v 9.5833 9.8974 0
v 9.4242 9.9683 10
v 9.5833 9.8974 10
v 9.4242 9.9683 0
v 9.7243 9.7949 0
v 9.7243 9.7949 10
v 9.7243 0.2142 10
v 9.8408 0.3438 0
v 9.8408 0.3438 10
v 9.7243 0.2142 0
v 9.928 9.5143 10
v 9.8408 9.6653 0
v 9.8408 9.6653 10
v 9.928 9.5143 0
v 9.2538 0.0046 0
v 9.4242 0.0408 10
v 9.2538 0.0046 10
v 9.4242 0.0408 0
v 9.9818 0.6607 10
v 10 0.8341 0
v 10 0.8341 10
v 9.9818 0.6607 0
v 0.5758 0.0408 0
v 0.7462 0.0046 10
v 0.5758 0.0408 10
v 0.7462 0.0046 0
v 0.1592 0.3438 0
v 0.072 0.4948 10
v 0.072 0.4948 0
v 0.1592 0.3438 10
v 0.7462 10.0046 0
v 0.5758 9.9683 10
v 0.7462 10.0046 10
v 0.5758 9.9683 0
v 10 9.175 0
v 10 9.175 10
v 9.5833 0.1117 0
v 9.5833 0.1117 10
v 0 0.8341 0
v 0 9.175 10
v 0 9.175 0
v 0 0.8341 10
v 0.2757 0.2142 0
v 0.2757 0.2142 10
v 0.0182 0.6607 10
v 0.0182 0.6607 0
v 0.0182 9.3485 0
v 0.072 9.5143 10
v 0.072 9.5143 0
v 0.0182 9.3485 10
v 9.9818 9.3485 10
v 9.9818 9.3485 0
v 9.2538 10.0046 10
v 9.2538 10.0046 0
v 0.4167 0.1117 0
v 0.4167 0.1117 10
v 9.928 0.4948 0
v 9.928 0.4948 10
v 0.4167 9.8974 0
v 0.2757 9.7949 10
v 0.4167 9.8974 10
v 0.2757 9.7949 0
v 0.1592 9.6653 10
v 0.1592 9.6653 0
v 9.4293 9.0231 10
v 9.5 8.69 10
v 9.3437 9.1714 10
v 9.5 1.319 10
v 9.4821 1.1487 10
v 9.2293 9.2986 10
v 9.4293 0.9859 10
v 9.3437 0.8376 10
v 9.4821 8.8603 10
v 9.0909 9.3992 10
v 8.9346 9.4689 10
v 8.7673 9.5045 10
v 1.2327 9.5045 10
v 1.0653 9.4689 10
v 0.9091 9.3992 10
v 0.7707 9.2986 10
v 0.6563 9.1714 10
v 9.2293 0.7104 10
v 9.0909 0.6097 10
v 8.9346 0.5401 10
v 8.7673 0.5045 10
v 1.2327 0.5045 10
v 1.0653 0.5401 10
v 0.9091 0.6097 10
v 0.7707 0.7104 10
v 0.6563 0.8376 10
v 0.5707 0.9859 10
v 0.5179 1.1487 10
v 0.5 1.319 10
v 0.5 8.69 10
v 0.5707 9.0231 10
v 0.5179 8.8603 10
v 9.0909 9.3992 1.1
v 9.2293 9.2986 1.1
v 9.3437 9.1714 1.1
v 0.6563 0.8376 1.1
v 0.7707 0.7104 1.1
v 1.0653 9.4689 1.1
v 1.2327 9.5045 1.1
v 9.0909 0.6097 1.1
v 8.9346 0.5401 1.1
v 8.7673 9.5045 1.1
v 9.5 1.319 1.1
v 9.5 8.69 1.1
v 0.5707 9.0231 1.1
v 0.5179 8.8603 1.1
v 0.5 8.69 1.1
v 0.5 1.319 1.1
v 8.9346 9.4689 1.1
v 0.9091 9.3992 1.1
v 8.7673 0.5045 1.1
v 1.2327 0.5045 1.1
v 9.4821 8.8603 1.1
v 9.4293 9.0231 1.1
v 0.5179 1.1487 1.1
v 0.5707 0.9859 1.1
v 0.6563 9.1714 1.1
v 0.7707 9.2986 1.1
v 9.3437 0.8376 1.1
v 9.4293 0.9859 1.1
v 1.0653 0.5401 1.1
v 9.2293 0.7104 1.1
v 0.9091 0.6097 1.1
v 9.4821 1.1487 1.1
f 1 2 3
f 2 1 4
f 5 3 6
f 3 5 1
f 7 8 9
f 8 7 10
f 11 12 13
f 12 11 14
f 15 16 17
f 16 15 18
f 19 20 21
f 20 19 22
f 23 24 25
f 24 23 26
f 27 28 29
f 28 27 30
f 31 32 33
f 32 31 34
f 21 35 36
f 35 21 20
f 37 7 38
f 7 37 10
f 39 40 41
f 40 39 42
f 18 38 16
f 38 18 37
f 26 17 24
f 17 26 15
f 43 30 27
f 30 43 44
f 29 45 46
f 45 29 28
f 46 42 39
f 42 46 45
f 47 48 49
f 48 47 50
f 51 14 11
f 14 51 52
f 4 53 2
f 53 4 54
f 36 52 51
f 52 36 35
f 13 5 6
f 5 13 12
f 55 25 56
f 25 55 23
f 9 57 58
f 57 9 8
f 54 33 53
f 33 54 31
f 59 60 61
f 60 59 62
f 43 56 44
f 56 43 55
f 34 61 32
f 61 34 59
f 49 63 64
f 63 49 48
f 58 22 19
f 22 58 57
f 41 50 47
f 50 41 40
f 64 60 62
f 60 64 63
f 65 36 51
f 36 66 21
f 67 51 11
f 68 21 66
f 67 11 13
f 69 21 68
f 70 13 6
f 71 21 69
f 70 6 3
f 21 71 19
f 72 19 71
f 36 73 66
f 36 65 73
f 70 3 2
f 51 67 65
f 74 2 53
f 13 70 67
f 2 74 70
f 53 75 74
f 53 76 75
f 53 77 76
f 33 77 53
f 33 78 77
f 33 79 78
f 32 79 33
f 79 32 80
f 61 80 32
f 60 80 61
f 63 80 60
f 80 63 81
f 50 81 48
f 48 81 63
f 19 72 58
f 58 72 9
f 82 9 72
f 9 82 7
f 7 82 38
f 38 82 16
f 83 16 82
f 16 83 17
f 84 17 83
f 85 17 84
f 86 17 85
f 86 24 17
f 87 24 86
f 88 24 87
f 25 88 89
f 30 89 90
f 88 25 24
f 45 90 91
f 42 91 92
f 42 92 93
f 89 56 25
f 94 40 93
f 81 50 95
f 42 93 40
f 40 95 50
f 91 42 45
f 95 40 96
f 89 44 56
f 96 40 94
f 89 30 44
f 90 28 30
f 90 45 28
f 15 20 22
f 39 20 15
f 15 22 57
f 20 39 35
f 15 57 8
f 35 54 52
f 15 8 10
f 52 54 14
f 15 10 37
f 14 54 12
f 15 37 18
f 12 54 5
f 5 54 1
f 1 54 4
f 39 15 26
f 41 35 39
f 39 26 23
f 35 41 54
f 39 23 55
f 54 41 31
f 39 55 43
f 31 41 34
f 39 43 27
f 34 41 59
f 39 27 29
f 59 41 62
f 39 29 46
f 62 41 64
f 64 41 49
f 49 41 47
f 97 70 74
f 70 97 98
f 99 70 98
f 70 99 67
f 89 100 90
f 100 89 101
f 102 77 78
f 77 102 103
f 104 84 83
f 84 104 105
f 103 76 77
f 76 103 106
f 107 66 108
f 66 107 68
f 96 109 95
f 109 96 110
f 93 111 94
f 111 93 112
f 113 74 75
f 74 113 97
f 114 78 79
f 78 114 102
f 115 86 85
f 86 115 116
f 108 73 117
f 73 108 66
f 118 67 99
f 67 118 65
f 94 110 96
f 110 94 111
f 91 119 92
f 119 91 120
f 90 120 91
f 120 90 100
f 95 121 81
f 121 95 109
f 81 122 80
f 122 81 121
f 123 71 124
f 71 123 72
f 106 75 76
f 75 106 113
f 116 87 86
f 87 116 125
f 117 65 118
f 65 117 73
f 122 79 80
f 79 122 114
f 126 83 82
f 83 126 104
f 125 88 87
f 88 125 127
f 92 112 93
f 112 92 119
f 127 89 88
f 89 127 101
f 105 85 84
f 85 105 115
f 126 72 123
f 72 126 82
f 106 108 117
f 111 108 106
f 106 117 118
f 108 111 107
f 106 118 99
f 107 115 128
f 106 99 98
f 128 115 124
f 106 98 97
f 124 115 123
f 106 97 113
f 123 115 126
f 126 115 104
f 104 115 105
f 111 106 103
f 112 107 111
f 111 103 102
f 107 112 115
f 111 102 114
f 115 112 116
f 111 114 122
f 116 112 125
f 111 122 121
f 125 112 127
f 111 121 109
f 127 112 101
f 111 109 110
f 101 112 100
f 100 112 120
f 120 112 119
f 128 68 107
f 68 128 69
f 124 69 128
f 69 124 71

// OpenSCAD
// file: hull.scad
/*
hull.scad - a library that leverages the hull() procedure
Author: Elliot Williams
github: https://gist.github.com/hexagon5un )
source: https://gist.github.com/hexagon5un/73e187dfa0404c69177795424f397ce6#file-hull-scad

Featured in the hackaday atricle: 'OPENSCAD: TIEING IT TOGETHER WITH HULL()'
https://hackaday.com/2018/02/13/openscad-tieing-it-together-with-hull/
*/
module multiHull(){
	for (i = [1 : $children-1])
		hull(){
			children(0);
			children(i);
		}
}

module sequentialHull(){
	for (i = [0: $children-2])
		hull(){
			children(i);
			children(i+1);
		}
}

/* Extended fun hull functions */ 

module cylinders(points, diameter, thickness){
	for (p=points){
		translate(p) cylinder(d=diameter, h=thickness, center=true);
	}
}

module plate(points, diameter, thickness, hole_diameter){
	difference(){
		hull() cylinders(points, diameter, thickness);
		cylinders(points, hole_diameter, 1000);
	}
}

module bar(length, width, thickness, hole_diameter){
	plate([[0,0,0], [length,0,0]], width, thickness, hole_diameter);
}

module rounded_box(points, radius, height, facets=30){
	hull(){
		for (p = points){
			translate(p)
				cylinder(r=radius, h=height, $fn=facets);
		}
	}
}

module point_cloud(points, radius=1, facets=8){
	for (p=points){
		translate(p)
			sphere(radius/cos(180/facets), $fn=facets);
		// polygon sphere circumscribed on radius
	}
}

module point_hull(points, radius=1, facets=8){
	hull(){
		point_cloud(points, radius, facets);
	}
}

// Shrink the exterior of the points so that the hull fits inside
function select(vector, i) = [ for (p=vector) p[i] ];
function axis_center(v, i) = (max(select(v, i)) - min(select(v,i)))/2;
function center(v) = [ for (i = [0,1,2]) axis_center(v, i) ];
function shrink_point(point, center, radius) = [ for (i = [0,1,2]) point[i] > center[i] ? point[i] - radius : point[i] + radius ]; 
function shrink(points, radius) = [ for (p = points) shrink_point(p, center(points), radius) ];

module interior_point_hull(points, radius=1){
	point_hull(shrink(points, radius), radius);
}

module interior_rounded_box(points, radius, height){
	rounded_box(shrink(points, radius), radius, height);
}


module mirror_copy(v = [1, 0, 0]) {
    children();
    mirror(v) children();
}
// file: basics.scad
///< Triangle module
use <math.scad>;
use <utils.scad>;
use <hull.scad>;

module tri(pt1, pt2, pt3, h=1) {
     color( rands( 0,1,3 ) ) linear_extrude( height=h )
	  polygon( points=[ pt1, pt2, pt3 ] );
}

module triangle( pts, h=1) {
     color( rands( 0,1,3 ) ) linear_extrude( height=h )
	  polygon( points = pts );
}

module oval(w,l, height, center = false, fn = 30) {
 scale([1, l/w, 1]) cylinder(h=height, r=w, center=center, $fn = fn);
}

module pipe( outer, inner, height, fn = 60 ){
     offset_percent = 0.25;
     inner_h = height + (offset_percent * 2 );
     difference(){
     ///< Debug with union(){
	  cylinder(r=outer, h = height, $fn = fn );
	  translate([0,0,-offset_percent]){
	       color("green",0.5)cylinder(r=inner, h = inner_h, $fn = fn );
	  }
     }
}

module rounded_pipe( r, h, fn = 60 ){
     cylinder(r = r, h = h, $fn = fn );

     color("blue")
     translate([0,0,h])
	  sphere(r, $fn = fn );

     color("red")
     translate([0,0,0])
	  sphere(r, $fn = fn );
}

/// Stackoverflow example module for a line
/// https://stackoverflow.com/questions/49533350/is-that-possible-to-draw-a-line-using-openscad-by-joining-different-points
module line(start, end, thickness = 1, fn = 30) {
    hull() {
        translate(start) sphere(thickness, $fn = fn);
        translate(end) sphere(thickness, $fn = fn);
    }
}


/*
Hulled box:

Parameterized box with rounded corners. This uses the hull.scad
to hull four cylinders around four point in space. This variation
offsets the box to zero/zero and takes in w,d,h to mesh better
with tuples.
*/
module hulled_cube( w, d, h, r = 1 ){
    points = [
        [ 0, 0, 0 ],
        [ w, 0, 0 ],
        [ 0, w, 0 ],
        [ w, w, 0 ],
        ];
    resize( [w,d,h]){
        translate( [r, r,0] ){
            rounded_box( points, radius = r, height=h );
        }
    }
}
// file: utils.scad
///< Utilities

function rand_clr() = rands( 0,1,3 );

///< Length conversions
function in2mm( i ) = ( i * 25.4 ); 
function mm2in( m ) = ( m / 25.4 );

/// This is pulled from stackoverflow
/// https://stackoverflow.com/questions/45826208/openscad-rotating-around-a-particular-point

// rotate as per a, v, but around point pt
module rotate_about_pt(a, v, pt) {
    translate(pt)
        rotate(a,v)
            translate(-pt)
                children();   
}
// file: math.scad
///< Math scad module


///< Find the hypotenuse from two sides of a right triangle
function hyp_from_sides( a, b ) = sqrt( pow( a, 2 ) + pow( b, 2 ) );

///< Find equal sides from hypotenuse of a right triangle
function sides_from_hyp(h) = sqrt( pow( h, 2 ) / 2 );

///< Find A from hypotenuse and B
function a_from_hb( h, b ) = sqrt( pow( h, 2 ) - pow( b, 2 ) );

function dist_2d( pt2, pt1 ) = sqrt(pow(( pt2[0]-pt1[0] ),2) + pow(( pt2[1]-pt1[1]),2) );

function mid_pt_2d( pt2, pt1 ) = [( pt1[0]+pt2[0] )/2, ( pt1[1]+pt2[1] )/2, 0 ];
///< Test for math functions

A = 3;
B = 4;
echo("Given A=", A, "and B=", B );
H = hyp_from_sides( A, B );
echo("Hypotenuse=", H );
echo("Calc Correct = ", (H == 5) );

echo("Given H=", H, " which is a hypotenuse with equal sides" );
echo( "the sides=", sides_from_hyp( H ) );

echo("Given H=", H, "B=", 4 );
echo("A=", a_from_hb( H, 4 ) );

echo("Distance from [-1,1] and [3,4] = ", dist_2d( [-1,1],[3,4]) );
// main file
///< Object definition
use <math.scad>;
use <utils.scad>;
use <basics.scad>;

///< Parameters
x = 0;
y = 0;
z = 0;

height = 10;
width  = 10;
depth  = 10;

///< Modules
module hulled_box( w, d, h, t = 1 ){
//    union(){
    difference(){
        hulled_cube( w, d, h );
        translate( [ t/2, t/2, t+0.1  ] )
            color( rand_clr() )hulled_cube( w-t, d-t, h-t );
    }
}


///< Build object
translate( [ x, y, z ] ) hulled_box( width, depth, height );
